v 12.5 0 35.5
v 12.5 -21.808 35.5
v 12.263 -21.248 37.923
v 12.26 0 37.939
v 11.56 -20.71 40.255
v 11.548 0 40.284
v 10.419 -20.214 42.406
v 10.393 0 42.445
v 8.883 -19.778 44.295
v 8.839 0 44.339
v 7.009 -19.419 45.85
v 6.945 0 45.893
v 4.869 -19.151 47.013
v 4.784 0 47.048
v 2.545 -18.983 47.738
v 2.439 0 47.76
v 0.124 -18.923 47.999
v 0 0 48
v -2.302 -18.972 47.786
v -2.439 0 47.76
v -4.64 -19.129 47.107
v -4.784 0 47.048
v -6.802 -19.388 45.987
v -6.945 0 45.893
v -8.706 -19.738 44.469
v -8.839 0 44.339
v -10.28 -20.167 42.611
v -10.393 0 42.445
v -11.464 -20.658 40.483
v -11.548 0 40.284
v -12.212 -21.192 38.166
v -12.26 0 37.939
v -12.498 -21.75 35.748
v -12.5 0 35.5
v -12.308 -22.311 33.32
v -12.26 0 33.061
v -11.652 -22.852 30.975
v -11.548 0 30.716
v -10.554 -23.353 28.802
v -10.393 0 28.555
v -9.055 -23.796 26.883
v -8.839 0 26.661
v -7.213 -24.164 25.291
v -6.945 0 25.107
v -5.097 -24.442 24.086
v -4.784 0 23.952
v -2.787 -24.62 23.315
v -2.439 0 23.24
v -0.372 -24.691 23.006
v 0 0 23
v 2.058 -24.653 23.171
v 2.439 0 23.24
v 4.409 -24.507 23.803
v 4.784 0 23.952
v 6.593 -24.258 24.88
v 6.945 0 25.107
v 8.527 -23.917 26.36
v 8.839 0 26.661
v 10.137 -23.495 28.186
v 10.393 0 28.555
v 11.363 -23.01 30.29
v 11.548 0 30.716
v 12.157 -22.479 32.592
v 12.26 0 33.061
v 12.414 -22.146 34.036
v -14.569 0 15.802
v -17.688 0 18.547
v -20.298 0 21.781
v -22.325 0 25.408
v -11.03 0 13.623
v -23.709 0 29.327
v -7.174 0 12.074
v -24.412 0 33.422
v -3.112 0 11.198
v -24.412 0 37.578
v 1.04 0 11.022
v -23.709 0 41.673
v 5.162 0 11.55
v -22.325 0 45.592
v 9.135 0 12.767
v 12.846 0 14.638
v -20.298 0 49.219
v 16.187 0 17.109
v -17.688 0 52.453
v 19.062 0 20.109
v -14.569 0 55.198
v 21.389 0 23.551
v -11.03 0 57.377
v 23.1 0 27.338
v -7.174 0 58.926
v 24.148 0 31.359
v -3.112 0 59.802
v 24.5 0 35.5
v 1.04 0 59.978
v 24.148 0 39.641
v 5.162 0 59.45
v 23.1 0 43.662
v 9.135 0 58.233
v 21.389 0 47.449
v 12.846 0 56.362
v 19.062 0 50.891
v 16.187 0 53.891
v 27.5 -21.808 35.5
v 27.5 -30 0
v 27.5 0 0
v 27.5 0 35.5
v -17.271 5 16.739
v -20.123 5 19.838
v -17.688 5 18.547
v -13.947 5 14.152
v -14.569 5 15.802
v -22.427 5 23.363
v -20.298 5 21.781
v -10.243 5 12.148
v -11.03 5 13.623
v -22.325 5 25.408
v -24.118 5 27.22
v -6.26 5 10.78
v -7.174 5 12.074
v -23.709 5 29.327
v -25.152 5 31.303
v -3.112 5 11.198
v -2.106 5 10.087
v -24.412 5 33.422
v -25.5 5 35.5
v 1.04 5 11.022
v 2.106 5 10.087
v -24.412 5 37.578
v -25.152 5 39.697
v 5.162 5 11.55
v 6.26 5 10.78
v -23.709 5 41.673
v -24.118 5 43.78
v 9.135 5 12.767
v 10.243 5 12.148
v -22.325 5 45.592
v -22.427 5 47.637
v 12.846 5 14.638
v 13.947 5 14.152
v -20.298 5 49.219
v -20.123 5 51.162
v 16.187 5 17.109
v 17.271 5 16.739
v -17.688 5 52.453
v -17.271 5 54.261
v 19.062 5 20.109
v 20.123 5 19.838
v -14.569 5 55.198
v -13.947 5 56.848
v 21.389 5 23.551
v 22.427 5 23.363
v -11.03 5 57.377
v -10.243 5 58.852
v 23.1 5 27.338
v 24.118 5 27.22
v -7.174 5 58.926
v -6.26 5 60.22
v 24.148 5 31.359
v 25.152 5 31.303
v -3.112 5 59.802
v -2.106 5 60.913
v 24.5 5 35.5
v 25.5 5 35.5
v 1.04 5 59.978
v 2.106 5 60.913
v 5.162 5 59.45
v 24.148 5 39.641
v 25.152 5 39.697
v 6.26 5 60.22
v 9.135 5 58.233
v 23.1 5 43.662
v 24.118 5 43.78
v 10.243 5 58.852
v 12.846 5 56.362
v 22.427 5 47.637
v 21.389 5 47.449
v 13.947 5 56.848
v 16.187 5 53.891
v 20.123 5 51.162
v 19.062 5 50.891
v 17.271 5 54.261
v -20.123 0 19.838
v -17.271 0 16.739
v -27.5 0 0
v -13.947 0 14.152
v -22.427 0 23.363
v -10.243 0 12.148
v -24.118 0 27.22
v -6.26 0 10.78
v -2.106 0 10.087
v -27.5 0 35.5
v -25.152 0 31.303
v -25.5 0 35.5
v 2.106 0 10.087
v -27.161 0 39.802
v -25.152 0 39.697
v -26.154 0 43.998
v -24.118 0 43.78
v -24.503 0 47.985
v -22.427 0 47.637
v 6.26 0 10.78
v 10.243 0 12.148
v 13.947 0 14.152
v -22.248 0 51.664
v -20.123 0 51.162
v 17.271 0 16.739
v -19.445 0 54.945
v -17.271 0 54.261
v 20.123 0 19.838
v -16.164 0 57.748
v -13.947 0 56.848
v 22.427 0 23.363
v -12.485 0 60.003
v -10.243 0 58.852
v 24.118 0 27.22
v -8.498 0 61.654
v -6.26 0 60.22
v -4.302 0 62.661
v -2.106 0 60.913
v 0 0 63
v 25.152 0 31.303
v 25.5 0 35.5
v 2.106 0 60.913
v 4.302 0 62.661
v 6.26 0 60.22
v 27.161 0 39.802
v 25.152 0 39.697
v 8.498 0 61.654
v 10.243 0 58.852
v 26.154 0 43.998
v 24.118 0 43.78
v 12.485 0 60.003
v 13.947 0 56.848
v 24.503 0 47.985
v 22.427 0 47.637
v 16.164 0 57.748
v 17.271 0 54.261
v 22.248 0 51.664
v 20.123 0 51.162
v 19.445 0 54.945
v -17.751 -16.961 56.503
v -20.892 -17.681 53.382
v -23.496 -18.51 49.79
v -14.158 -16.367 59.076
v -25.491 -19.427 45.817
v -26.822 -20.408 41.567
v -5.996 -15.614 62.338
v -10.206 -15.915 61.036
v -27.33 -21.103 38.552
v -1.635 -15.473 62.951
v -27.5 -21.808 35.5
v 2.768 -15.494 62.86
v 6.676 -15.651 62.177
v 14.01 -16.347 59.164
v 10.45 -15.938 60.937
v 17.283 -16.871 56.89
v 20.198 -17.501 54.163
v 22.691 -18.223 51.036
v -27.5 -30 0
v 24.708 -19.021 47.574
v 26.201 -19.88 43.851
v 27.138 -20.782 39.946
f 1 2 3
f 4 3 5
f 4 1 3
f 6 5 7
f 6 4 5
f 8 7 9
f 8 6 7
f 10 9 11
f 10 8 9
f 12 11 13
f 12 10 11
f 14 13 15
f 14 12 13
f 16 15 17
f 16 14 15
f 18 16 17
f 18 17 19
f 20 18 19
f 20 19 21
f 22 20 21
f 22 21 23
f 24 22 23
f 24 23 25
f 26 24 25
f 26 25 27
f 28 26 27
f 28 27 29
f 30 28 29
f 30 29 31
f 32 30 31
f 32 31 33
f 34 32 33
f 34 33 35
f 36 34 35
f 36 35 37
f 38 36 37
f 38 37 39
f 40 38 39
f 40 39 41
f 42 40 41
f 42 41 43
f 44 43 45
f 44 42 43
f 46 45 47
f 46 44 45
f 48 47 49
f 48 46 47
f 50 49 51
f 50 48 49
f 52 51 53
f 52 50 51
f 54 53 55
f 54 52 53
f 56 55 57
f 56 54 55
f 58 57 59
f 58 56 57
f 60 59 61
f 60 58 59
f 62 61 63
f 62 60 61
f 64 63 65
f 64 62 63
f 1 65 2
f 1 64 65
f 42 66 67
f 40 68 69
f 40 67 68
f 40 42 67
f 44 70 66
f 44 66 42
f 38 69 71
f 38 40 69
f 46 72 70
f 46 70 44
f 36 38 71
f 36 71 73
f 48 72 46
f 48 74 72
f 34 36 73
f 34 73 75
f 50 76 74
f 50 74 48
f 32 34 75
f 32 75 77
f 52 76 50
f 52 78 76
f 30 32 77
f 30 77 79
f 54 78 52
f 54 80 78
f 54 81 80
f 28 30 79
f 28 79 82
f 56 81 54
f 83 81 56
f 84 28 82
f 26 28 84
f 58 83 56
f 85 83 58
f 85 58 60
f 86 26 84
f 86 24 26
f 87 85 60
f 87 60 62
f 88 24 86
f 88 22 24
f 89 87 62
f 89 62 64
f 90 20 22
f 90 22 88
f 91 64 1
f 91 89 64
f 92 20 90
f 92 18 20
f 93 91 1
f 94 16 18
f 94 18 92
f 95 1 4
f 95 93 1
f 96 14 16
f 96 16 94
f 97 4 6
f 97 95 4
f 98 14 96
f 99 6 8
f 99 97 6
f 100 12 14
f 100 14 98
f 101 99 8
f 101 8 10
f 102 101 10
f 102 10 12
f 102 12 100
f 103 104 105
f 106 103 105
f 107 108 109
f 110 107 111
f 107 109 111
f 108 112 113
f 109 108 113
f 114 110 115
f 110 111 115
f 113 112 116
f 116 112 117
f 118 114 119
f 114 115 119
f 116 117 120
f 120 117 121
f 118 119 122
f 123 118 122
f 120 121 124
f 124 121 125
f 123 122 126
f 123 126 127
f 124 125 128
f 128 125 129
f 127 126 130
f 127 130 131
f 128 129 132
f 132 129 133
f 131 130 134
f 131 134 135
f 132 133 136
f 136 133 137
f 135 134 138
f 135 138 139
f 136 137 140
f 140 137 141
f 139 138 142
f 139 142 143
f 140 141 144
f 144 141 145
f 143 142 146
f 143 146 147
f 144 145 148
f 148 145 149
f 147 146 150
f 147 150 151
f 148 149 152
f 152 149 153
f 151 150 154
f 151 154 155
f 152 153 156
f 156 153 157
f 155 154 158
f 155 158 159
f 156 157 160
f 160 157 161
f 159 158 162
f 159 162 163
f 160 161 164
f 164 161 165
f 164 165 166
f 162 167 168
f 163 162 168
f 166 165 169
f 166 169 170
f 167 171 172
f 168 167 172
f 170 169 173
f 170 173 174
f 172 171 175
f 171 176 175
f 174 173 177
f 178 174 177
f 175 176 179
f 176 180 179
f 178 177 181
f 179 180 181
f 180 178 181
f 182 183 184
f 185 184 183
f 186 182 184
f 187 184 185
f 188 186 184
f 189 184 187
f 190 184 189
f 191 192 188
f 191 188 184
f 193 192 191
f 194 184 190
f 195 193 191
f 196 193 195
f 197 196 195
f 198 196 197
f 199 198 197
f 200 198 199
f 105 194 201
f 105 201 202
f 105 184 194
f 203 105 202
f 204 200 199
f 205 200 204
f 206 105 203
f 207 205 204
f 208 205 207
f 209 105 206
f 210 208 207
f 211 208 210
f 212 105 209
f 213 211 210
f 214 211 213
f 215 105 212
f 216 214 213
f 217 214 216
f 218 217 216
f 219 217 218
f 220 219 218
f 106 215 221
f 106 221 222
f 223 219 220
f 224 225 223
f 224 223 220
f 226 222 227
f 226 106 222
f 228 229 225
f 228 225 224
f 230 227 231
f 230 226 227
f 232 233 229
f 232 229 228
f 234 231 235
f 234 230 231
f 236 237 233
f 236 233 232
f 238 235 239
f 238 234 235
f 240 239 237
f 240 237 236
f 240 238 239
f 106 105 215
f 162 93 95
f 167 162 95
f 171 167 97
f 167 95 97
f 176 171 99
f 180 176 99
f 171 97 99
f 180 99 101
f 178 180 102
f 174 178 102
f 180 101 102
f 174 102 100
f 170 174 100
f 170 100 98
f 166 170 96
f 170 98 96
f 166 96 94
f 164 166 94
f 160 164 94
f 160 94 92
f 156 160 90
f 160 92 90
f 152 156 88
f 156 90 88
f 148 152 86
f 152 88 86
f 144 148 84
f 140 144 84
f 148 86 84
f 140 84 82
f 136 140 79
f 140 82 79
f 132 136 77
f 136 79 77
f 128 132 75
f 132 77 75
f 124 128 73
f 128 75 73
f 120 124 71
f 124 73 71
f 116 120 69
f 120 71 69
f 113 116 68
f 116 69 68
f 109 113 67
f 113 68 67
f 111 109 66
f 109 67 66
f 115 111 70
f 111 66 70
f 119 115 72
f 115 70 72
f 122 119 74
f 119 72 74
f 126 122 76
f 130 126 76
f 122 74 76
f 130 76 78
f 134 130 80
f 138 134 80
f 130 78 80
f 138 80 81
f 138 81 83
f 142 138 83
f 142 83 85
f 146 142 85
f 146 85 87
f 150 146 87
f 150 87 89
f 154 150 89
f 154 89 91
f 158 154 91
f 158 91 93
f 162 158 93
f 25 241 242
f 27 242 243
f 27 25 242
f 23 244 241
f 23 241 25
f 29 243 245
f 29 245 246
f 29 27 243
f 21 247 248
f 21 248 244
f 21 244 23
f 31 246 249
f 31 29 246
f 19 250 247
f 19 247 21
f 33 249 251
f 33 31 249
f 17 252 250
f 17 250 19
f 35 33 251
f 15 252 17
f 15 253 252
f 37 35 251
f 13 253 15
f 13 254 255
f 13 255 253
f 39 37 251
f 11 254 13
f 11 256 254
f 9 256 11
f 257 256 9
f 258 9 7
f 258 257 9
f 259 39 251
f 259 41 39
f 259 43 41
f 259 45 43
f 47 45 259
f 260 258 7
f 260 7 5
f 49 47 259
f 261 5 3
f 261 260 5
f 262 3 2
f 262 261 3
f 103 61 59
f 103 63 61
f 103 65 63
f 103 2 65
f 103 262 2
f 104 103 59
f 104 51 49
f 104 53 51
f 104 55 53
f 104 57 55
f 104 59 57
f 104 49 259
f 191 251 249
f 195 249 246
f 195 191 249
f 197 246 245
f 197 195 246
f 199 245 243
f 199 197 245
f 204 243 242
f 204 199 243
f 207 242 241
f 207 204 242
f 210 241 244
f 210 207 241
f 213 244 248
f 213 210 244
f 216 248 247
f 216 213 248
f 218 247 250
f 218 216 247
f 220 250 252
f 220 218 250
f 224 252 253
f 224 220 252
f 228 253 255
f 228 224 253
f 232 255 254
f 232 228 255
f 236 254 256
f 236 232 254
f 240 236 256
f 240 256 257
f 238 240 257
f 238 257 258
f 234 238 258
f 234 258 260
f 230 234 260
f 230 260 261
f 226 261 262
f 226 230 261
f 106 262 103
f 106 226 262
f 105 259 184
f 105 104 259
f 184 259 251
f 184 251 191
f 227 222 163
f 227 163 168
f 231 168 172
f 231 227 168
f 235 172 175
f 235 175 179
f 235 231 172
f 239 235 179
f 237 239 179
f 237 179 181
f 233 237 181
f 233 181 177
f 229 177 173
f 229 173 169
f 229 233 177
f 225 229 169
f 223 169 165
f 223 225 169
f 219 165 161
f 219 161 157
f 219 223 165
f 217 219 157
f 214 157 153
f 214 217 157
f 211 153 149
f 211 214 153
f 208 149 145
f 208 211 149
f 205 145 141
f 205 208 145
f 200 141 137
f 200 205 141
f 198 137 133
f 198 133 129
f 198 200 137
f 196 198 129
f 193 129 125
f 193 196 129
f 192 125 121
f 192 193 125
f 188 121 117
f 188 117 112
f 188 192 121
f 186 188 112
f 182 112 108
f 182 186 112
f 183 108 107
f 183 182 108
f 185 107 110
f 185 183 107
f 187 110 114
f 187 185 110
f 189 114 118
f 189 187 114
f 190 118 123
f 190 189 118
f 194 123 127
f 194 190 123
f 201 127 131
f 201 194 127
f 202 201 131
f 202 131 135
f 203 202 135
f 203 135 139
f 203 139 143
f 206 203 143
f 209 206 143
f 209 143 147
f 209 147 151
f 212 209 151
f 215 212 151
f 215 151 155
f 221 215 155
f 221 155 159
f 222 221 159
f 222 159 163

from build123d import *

# Parameters (mm, degrees)
F0_R     = 25.5
F0_R_2   = 24.5
F1_DEPTH = 5
F3_DEPTH = 27.5
F4_R     = 12.5
F5_DEPTH = 30.001


with BuildPart() as f1:
    # F0 (on Front) → F1 (new body)
    with BuildSketch(Plane.XZ):
        with Locations((0, 35.5)):
            Circle(F0_R)
        with Locations((0, 35.5)):
            Circle(F0_R_2, mode=Mode.SUBTRACT)
    extrude(amount=-F1_DEPTH)

    # F2 (on Right) → F3 (join, symmetric)
    with BuildSketch(Plane.YZ):
        Polygon((-30, 0), (0, 0), (0, 65), (-15, 65), align=None)
    extrude(amount=F3_DEPTH, both=True)

    # F4 (on Front) → F5 (cut, through all)
    with BuildSketch(Plane.XZ):
        with BuildLine():
            ThreePointArc((-27.5, 35.5), (0, 63), (27.5, 35.5))
            Line((27.5, 35.5), (32.5, 35.5))
            Line((32.5, 35.5), (32.5, 70))
            Line((32.5, 70), (-32.5, 70))
            Line((-32.5, 70), (-32.5, 35.5))
            Line((-32.5, 35.5), (-27.5, 35.5))
        make_face()
        with Locations((0, 35.5)):
            Circle(F4_R)
    extrude(amount=F5_DEPTH, mode=Mode.SUBTRACT)


solid = f1.part
